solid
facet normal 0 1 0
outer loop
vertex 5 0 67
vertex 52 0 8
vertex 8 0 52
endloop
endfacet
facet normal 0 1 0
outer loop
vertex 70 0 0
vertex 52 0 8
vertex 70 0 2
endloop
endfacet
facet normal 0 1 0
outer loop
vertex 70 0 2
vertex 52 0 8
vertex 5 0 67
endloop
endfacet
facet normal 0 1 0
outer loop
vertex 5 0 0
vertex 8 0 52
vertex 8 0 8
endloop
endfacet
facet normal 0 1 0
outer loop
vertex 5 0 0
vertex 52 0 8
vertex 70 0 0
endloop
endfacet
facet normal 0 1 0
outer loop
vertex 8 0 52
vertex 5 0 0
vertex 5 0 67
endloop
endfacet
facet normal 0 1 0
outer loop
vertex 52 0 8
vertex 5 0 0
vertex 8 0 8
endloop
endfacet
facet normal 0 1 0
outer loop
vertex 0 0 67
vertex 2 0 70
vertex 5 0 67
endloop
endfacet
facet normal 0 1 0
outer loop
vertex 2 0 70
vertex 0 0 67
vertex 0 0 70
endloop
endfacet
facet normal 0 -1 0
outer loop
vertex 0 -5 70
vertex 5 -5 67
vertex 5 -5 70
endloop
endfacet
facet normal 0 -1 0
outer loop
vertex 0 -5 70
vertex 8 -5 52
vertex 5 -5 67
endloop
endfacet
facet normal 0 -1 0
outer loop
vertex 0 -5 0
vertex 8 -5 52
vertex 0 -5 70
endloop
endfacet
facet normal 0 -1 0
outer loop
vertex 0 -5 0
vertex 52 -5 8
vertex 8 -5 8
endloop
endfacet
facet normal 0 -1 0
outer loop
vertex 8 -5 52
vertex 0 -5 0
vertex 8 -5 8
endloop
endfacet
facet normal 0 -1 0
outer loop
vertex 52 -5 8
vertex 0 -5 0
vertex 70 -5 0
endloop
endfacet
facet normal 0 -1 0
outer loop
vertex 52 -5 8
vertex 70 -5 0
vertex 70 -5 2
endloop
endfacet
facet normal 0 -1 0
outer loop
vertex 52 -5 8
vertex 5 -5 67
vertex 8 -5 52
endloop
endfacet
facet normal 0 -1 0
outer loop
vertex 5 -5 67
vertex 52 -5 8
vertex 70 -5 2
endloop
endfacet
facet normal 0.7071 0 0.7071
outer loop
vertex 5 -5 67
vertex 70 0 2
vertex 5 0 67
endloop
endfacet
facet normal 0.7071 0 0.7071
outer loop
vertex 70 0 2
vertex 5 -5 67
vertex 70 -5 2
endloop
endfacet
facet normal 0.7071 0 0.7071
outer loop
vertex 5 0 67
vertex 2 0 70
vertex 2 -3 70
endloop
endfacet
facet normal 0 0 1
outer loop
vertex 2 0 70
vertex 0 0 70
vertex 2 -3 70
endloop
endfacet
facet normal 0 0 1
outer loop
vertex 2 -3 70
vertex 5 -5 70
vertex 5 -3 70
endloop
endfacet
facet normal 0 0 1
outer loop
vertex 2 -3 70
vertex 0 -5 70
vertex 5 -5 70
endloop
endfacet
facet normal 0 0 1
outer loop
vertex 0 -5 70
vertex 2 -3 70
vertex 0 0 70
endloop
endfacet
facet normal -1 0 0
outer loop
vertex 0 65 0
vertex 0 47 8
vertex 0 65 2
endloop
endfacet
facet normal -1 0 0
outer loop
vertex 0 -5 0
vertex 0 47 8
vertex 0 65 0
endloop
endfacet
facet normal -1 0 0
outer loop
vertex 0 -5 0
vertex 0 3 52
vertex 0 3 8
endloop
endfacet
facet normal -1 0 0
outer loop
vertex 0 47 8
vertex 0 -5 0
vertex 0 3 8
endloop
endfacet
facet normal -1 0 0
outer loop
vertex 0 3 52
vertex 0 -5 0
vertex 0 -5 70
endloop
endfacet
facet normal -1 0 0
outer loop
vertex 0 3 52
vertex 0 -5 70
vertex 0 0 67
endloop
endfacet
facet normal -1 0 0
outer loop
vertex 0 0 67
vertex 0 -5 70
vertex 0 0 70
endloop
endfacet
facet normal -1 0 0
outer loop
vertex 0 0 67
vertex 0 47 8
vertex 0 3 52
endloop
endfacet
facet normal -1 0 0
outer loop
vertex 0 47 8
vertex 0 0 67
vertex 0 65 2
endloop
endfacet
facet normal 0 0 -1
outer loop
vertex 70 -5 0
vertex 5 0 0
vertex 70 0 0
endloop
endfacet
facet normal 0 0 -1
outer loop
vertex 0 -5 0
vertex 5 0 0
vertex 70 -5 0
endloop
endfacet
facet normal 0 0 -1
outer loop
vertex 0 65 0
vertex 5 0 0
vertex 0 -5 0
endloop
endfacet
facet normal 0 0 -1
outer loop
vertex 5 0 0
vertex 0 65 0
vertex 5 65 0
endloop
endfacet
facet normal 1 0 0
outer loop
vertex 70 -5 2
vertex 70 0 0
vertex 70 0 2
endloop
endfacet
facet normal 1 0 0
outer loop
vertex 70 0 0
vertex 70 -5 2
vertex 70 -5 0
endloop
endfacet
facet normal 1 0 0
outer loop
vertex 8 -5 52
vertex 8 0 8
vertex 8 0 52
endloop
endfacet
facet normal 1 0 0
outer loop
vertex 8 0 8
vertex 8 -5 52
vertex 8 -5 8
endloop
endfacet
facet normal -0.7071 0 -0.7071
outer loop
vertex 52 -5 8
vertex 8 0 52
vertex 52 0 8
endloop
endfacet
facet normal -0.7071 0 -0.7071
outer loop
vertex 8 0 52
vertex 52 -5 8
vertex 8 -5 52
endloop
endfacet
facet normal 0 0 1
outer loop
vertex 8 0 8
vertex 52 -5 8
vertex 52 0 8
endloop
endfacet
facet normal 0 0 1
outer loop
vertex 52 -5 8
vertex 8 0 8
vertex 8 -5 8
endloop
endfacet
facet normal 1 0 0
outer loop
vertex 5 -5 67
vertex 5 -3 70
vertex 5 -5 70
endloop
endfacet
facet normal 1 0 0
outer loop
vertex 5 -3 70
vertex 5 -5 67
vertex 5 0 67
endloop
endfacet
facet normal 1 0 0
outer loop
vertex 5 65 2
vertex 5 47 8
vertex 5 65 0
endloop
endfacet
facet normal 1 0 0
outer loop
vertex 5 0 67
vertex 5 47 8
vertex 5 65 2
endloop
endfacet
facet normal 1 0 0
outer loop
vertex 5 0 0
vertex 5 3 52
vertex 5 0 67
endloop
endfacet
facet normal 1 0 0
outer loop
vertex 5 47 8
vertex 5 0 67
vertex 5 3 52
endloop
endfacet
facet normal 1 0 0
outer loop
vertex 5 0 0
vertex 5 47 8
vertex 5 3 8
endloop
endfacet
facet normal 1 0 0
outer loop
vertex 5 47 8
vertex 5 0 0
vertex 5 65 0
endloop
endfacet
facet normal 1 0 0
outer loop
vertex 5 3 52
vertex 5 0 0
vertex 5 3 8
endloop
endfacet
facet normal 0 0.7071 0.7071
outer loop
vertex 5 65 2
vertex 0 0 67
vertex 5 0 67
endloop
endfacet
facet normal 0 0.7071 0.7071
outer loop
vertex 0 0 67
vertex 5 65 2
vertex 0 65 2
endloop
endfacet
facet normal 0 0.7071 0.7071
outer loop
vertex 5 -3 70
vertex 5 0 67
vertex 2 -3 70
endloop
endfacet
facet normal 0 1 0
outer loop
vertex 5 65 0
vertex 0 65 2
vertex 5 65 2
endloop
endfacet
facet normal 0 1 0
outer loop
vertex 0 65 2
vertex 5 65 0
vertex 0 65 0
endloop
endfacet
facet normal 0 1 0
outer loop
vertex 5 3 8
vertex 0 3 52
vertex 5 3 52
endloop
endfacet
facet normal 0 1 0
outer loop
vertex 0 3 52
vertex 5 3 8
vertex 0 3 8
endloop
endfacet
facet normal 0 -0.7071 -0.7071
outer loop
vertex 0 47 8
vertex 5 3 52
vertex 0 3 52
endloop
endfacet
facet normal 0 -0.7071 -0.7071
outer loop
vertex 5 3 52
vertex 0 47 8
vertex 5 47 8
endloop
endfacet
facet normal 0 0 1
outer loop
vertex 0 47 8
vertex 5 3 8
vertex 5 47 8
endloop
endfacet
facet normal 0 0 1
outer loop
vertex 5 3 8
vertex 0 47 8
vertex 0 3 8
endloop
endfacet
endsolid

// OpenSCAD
module triangle() {
    rotate([90,0,0]) linear_extrude(height=5) {
        difference() {
            polygon(points=[[0,0],[0,70],[2,70], [70,2], [70,0]]);
            polygon(points=[[8,8],[8,52],[52,8]]);
        }
    }
}

union() {
    triangle();
    translate([0,-5,0]) rotate([0,0,90]) triangle();
}
